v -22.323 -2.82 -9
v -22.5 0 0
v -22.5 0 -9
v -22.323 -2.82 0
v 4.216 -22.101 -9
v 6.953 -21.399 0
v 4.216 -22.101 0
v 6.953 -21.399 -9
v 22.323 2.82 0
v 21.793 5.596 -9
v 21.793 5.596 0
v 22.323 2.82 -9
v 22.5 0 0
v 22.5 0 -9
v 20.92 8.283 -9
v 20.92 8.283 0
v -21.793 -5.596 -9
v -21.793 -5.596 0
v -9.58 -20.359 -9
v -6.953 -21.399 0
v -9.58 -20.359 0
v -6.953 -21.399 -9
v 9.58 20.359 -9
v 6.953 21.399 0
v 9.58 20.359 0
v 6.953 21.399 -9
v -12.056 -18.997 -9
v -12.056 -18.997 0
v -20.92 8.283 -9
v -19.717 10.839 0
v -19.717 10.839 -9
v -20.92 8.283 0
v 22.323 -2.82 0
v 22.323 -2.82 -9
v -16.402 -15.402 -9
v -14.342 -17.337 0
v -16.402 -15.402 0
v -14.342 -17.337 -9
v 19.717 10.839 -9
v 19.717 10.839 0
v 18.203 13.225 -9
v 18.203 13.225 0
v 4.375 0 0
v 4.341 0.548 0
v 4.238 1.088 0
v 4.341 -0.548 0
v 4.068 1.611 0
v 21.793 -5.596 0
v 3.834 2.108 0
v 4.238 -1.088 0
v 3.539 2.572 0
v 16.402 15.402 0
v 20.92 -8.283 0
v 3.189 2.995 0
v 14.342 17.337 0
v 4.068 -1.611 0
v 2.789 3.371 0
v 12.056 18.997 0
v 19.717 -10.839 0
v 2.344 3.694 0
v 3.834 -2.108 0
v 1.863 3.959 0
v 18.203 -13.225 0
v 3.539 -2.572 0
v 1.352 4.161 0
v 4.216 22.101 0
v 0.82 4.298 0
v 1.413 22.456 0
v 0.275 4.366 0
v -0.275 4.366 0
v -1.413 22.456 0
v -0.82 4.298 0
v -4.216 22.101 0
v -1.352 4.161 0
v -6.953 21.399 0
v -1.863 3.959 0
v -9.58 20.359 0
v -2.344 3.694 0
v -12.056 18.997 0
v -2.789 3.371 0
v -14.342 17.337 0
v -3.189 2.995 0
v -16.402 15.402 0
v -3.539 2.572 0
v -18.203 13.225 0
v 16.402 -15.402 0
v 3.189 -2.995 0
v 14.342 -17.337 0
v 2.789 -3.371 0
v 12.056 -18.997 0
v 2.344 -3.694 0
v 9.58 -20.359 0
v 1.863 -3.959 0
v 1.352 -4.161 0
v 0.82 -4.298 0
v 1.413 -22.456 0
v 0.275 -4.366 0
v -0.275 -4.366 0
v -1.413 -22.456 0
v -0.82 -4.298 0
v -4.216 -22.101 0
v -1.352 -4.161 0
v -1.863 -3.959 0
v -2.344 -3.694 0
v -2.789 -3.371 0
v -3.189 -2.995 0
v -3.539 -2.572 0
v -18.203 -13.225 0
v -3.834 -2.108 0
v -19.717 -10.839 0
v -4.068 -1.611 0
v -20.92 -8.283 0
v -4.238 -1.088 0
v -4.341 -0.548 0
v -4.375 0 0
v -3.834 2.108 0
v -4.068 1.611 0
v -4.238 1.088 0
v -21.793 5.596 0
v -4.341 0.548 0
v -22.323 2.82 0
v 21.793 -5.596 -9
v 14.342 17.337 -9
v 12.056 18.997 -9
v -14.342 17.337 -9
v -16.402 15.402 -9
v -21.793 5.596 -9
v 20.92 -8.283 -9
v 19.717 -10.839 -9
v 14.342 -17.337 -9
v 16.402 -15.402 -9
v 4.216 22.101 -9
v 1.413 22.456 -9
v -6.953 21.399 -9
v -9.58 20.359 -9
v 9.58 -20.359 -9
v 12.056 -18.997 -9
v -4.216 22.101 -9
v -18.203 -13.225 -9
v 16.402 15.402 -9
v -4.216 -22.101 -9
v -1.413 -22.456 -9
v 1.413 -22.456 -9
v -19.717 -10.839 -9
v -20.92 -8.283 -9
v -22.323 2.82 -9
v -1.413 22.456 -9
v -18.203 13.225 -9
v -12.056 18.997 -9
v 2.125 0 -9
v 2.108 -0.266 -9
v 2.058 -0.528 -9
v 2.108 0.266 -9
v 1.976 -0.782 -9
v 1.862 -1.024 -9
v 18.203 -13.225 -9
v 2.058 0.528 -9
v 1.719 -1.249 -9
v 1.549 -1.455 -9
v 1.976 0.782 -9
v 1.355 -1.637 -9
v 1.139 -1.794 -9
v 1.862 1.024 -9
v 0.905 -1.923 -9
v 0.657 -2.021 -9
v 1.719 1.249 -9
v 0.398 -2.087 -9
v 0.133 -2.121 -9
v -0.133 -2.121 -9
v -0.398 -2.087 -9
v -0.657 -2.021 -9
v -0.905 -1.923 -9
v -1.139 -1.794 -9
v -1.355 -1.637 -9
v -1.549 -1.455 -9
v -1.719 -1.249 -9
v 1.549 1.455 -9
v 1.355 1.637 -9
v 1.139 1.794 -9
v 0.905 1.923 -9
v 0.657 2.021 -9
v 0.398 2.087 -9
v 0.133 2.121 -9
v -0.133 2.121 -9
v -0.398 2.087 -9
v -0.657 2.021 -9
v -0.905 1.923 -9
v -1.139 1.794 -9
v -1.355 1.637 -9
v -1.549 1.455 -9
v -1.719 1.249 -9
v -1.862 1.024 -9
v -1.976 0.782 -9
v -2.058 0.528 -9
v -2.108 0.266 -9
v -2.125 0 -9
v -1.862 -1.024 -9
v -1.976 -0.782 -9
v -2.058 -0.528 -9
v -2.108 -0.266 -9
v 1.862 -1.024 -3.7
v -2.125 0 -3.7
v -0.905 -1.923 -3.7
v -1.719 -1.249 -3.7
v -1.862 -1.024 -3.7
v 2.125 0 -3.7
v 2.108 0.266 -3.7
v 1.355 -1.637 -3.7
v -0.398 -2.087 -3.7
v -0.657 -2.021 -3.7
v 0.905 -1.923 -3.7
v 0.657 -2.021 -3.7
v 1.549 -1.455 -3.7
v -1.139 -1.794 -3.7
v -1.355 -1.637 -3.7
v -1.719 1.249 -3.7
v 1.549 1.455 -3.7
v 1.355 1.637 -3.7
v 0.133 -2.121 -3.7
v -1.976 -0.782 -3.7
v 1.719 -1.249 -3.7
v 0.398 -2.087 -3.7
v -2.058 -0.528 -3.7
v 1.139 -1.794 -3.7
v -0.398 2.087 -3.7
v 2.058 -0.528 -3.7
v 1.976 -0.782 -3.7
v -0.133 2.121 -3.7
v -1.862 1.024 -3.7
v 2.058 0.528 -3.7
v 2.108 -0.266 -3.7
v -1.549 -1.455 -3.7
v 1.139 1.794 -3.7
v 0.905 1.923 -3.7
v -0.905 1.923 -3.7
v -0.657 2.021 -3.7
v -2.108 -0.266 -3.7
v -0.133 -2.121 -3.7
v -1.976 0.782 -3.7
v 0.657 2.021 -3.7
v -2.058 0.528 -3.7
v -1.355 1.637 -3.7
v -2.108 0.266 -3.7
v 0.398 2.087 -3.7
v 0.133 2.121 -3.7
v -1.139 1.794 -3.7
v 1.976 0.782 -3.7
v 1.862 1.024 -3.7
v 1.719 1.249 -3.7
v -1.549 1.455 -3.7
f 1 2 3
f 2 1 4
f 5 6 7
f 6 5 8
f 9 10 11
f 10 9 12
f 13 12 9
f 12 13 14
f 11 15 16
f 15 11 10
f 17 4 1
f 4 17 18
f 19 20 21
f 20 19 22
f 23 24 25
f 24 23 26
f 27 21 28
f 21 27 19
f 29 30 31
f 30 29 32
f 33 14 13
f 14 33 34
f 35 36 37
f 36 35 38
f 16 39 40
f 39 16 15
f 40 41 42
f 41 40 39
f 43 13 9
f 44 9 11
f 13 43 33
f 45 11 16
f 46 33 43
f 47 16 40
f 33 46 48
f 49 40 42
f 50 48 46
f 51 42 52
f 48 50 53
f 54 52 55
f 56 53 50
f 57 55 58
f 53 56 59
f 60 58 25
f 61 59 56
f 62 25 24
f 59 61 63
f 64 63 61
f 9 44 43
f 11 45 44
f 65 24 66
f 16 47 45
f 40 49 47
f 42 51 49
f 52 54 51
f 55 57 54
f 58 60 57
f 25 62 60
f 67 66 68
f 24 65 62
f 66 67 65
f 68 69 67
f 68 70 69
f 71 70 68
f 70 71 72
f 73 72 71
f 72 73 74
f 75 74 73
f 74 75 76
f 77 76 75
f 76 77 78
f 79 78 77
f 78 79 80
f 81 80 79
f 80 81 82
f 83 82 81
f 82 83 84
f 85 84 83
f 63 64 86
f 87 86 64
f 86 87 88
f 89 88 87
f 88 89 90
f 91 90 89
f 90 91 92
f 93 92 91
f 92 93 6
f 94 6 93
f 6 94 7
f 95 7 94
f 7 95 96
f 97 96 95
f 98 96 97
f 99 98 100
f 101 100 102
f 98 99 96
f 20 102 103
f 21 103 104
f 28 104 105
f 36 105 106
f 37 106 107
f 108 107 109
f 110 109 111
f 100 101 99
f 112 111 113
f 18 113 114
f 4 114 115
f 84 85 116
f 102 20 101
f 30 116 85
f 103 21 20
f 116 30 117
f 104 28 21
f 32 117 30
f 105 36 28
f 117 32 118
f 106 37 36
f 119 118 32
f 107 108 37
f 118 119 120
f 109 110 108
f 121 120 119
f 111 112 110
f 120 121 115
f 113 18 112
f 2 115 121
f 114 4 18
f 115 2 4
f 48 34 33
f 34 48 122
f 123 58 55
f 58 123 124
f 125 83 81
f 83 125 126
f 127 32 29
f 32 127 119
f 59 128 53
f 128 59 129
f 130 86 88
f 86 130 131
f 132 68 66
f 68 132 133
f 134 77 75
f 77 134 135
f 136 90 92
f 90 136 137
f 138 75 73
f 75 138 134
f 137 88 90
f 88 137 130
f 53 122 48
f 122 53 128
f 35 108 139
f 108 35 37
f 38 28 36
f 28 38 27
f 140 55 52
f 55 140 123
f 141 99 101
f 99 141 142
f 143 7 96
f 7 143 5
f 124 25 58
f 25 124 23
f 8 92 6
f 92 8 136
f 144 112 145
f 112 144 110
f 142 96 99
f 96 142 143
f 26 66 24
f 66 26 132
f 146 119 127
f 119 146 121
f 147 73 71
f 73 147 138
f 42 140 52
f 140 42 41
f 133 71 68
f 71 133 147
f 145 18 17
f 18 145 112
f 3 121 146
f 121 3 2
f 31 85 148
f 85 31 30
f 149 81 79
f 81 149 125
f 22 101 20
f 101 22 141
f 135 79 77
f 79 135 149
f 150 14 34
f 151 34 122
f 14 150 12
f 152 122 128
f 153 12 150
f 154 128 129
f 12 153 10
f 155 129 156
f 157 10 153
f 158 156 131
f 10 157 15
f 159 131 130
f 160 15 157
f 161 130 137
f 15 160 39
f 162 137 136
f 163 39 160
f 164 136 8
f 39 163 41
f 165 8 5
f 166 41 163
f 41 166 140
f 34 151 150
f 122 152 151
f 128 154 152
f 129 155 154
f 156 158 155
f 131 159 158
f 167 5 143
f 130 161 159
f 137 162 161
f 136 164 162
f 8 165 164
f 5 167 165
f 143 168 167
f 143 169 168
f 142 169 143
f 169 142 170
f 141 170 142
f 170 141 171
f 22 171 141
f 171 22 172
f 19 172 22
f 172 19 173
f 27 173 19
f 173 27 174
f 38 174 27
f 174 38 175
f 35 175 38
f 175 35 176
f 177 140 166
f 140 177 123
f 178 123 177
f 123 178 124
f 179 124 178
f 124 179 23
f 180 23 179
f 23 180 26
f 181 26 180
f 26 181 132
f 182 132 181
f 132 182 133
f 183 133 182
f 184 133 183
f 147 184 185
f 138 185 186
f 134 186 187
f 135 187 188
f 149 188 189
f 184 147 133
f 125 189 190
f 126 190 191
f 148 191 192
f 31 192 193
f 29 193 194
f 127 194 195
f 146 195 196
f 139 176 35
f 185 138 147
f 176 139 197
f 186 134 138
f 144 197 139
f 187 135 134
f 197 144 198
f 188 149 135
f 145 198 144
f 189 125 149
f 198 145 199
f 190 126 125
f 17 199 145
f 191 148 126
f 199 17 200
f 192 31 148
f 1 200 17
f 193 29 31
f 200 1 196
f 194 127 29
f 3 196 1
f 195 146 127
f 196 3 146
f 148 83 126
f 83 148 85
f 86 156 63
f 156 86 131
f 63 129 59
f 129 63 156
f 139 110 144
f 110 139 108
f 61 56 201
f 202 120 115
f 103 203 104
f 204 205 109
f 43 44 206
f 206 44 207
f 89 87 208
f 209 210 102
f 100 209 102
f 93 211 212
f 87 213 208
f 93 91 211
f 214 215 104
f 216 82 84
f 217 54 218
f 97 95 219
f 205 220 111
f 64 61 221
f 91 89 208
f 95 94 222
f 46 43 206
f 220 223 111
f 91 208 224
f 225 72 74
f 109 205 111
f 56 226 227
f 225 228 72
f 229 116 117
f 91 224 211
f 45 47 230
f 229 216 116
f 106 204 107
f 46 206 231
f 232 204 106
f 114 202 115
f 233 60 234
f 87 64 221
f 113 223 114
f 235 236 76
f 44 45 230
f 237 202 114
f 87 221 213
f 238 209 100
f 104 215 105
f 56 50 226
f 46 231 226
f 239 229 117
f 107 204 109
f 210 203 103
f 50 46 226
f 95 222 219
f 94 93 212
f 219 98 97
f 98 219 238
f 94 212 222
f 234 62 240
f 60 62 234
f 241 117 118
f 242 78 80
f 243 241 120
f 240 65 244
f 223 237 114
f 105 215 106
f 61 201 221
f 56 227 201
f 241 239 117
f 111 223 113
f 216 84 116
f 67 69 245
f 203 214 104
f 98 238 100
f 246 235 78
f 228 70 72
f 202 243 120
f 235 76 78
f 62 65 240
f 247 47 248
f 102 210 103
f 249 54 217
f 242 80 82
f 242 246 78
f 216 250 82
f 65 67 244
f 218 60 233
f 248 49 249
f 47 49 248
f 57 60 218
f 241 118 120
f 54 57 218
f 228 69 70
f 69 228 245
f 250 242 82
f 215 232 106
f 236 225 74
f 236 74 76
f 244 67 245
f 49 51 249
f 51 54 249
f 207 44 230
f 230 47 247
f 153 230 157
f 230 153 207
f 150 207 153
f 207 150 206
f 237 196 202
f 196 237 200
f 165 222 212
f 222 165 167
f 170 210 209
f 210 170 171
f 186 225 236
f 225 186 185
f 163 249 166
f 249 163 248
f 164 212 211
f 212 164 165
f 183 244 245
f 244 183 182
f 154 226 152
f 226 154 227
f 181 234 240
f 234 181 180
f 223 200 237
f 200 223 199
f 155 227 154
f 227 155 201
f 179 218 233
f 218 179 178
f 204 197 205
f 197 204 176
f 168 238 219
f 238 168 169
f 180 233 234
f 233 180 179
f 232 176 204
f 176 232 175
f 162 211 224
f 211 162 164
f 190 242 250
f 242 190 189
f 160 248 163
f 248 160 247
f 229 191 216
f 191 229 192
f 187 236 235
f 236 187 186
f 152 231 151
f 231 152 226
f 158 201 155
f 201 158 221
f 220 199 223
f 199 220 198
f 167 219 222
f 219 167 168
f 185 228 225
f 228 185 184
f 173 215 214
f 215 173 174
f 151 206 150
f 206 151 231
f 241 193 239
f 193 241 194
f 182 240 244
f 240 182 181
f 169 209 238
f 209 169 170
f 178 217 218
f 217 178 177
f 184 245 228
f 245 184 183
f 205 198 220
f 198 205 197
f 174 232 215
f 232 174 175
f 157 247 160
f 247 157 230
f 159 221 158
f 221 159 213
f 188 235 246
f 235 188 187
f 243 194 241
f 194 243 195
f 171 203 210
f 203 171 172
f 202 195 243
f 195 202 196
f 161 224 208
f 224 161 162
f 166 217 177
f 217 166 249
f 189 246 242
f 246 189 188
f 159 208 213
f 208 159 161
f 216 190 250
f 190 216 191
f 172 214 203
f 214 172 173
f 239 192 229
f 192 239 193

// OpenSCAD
$fn = 50;


difference() {
	union() {
		translate(v = [0, 0, -9.0000000000]) {
			cylinder(h = 9, r = 22.5000000000);
		}
		translate(v = [0, 0, -9.0000000000]) {
			cylinder(h = 9, r = 2.8750000000);
		}
	}
	union() {
		translate(v = [0, 0, 0]) {
			rotate(a = [0, 0, 0]) {
				difference() {
					union() {
						#translate(v = [0, 0, -9.0000000000]) {
							cylinder(h = 9, r = 2.0000000000);
						}
						#translate(v = [0, 0, -3.7000000000]) {
							cylinder(h = 3.7000000000, r1 = 2.1250000000, r2 = 4.3750000000);
						}
						#translate(v = [0, 0, -9.0000000000]) {
							cylinder(h = 9, r = 2.1250000000);
						}
						#translate(v = [0, 0, -9.0000000000]) {
							cylinder(h = 9, r = 2.0000000000);
						}
					}
					union();
				}
			}
		}
	}
}
